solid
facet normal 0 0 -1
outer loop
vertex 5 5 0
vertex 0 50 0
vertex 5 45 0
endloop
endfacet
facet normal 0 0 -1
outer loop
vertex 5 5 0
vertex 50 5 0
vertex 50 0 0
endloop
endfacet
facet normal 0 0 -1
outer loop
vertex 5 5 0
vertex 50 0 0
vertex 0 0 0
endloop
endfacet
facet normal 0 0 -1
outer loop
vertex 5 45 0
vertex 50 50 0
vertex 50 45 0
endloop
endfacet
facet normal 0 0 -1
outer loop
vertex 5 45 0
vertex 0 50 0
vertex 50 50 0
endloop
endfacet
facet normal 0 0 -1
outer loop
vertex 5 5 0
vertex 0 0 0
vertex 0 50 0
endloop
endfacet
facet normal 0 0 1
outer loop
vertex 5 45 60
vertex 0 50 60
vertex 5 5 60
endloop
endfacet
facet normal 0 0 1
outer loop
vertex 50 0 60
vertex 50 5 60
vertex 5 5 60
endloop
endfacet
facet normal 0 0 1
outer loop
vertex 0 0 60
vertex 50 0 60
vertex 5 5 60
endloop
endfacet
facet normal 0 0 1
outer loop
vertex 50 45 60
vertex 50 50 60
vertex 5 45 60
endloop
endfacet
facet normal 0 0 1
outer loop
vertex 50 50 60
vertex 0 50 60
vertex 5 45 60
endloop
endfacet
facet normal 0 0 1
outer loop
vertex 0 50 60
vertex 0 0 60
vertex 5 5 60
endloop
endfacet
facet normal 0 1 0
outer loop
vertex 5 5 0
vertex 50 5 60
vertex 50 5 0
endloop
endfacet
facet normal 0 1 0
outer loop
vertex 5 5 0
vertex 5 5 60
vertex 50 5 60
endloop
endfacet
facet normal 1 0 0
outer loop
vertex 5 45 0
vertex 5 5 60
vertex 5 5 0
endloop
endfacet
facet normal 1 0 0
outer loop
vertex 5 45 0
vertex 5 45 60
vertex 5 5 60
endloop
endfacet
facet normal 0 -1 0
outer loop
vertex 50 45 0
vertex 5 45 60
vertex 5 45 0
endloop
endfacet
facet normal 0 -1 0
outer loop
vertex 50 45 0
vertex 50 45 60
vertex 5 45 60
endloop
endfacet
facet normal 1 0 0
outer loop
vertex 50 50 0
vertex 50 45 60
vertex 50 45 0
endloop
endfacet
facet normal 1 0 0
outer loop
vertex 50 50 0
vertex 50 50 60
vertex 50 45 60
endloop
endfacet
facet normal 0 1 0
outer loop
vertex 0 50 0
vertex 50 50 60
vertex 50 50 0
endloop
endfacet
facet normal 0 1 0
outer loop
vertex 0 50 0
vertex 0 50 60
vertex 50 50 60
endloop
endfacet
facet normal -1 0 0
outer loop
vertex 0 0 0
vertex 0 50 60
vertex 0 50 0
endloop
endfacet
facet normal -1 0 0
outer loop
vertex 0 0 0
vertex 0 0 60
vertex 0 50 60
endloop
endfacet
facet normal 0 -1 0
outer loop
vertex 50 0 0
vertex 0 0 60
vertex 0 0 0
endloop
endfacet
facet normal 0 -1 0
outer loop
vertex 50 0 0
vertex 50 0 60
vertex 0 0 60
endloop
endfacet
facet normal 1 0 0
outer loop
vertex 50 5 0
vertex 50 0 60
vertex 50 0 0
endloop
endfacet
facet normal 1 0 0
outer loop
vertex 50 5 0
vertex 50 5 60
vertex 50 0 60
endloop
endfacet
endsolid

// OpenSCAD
$fn = 32;

// ----------------------------------------------------------------------
// Structural section: channel 50 x 50 mm
// ----------------------------------------------------------------------

// --- parameters (mm) ---
sec_w = 50;               // channel width, X
sec_h = 50;               // channel height, Y
flange_t = 5;             // flange thickness
web_t = 5;                // web thickness
plate_t = 60;             // cut length, Z (extrusion height)

profile = [[0, 0], [50, 0], [50, 5], [5, 5], [5, 45], [50, 45], [50, 50], [0, 50]];  // primary outline, 8 points, counter clockwise

// --- the one profile operation ---
linear_extrude(height = plate_t) polygon(points = profile);
